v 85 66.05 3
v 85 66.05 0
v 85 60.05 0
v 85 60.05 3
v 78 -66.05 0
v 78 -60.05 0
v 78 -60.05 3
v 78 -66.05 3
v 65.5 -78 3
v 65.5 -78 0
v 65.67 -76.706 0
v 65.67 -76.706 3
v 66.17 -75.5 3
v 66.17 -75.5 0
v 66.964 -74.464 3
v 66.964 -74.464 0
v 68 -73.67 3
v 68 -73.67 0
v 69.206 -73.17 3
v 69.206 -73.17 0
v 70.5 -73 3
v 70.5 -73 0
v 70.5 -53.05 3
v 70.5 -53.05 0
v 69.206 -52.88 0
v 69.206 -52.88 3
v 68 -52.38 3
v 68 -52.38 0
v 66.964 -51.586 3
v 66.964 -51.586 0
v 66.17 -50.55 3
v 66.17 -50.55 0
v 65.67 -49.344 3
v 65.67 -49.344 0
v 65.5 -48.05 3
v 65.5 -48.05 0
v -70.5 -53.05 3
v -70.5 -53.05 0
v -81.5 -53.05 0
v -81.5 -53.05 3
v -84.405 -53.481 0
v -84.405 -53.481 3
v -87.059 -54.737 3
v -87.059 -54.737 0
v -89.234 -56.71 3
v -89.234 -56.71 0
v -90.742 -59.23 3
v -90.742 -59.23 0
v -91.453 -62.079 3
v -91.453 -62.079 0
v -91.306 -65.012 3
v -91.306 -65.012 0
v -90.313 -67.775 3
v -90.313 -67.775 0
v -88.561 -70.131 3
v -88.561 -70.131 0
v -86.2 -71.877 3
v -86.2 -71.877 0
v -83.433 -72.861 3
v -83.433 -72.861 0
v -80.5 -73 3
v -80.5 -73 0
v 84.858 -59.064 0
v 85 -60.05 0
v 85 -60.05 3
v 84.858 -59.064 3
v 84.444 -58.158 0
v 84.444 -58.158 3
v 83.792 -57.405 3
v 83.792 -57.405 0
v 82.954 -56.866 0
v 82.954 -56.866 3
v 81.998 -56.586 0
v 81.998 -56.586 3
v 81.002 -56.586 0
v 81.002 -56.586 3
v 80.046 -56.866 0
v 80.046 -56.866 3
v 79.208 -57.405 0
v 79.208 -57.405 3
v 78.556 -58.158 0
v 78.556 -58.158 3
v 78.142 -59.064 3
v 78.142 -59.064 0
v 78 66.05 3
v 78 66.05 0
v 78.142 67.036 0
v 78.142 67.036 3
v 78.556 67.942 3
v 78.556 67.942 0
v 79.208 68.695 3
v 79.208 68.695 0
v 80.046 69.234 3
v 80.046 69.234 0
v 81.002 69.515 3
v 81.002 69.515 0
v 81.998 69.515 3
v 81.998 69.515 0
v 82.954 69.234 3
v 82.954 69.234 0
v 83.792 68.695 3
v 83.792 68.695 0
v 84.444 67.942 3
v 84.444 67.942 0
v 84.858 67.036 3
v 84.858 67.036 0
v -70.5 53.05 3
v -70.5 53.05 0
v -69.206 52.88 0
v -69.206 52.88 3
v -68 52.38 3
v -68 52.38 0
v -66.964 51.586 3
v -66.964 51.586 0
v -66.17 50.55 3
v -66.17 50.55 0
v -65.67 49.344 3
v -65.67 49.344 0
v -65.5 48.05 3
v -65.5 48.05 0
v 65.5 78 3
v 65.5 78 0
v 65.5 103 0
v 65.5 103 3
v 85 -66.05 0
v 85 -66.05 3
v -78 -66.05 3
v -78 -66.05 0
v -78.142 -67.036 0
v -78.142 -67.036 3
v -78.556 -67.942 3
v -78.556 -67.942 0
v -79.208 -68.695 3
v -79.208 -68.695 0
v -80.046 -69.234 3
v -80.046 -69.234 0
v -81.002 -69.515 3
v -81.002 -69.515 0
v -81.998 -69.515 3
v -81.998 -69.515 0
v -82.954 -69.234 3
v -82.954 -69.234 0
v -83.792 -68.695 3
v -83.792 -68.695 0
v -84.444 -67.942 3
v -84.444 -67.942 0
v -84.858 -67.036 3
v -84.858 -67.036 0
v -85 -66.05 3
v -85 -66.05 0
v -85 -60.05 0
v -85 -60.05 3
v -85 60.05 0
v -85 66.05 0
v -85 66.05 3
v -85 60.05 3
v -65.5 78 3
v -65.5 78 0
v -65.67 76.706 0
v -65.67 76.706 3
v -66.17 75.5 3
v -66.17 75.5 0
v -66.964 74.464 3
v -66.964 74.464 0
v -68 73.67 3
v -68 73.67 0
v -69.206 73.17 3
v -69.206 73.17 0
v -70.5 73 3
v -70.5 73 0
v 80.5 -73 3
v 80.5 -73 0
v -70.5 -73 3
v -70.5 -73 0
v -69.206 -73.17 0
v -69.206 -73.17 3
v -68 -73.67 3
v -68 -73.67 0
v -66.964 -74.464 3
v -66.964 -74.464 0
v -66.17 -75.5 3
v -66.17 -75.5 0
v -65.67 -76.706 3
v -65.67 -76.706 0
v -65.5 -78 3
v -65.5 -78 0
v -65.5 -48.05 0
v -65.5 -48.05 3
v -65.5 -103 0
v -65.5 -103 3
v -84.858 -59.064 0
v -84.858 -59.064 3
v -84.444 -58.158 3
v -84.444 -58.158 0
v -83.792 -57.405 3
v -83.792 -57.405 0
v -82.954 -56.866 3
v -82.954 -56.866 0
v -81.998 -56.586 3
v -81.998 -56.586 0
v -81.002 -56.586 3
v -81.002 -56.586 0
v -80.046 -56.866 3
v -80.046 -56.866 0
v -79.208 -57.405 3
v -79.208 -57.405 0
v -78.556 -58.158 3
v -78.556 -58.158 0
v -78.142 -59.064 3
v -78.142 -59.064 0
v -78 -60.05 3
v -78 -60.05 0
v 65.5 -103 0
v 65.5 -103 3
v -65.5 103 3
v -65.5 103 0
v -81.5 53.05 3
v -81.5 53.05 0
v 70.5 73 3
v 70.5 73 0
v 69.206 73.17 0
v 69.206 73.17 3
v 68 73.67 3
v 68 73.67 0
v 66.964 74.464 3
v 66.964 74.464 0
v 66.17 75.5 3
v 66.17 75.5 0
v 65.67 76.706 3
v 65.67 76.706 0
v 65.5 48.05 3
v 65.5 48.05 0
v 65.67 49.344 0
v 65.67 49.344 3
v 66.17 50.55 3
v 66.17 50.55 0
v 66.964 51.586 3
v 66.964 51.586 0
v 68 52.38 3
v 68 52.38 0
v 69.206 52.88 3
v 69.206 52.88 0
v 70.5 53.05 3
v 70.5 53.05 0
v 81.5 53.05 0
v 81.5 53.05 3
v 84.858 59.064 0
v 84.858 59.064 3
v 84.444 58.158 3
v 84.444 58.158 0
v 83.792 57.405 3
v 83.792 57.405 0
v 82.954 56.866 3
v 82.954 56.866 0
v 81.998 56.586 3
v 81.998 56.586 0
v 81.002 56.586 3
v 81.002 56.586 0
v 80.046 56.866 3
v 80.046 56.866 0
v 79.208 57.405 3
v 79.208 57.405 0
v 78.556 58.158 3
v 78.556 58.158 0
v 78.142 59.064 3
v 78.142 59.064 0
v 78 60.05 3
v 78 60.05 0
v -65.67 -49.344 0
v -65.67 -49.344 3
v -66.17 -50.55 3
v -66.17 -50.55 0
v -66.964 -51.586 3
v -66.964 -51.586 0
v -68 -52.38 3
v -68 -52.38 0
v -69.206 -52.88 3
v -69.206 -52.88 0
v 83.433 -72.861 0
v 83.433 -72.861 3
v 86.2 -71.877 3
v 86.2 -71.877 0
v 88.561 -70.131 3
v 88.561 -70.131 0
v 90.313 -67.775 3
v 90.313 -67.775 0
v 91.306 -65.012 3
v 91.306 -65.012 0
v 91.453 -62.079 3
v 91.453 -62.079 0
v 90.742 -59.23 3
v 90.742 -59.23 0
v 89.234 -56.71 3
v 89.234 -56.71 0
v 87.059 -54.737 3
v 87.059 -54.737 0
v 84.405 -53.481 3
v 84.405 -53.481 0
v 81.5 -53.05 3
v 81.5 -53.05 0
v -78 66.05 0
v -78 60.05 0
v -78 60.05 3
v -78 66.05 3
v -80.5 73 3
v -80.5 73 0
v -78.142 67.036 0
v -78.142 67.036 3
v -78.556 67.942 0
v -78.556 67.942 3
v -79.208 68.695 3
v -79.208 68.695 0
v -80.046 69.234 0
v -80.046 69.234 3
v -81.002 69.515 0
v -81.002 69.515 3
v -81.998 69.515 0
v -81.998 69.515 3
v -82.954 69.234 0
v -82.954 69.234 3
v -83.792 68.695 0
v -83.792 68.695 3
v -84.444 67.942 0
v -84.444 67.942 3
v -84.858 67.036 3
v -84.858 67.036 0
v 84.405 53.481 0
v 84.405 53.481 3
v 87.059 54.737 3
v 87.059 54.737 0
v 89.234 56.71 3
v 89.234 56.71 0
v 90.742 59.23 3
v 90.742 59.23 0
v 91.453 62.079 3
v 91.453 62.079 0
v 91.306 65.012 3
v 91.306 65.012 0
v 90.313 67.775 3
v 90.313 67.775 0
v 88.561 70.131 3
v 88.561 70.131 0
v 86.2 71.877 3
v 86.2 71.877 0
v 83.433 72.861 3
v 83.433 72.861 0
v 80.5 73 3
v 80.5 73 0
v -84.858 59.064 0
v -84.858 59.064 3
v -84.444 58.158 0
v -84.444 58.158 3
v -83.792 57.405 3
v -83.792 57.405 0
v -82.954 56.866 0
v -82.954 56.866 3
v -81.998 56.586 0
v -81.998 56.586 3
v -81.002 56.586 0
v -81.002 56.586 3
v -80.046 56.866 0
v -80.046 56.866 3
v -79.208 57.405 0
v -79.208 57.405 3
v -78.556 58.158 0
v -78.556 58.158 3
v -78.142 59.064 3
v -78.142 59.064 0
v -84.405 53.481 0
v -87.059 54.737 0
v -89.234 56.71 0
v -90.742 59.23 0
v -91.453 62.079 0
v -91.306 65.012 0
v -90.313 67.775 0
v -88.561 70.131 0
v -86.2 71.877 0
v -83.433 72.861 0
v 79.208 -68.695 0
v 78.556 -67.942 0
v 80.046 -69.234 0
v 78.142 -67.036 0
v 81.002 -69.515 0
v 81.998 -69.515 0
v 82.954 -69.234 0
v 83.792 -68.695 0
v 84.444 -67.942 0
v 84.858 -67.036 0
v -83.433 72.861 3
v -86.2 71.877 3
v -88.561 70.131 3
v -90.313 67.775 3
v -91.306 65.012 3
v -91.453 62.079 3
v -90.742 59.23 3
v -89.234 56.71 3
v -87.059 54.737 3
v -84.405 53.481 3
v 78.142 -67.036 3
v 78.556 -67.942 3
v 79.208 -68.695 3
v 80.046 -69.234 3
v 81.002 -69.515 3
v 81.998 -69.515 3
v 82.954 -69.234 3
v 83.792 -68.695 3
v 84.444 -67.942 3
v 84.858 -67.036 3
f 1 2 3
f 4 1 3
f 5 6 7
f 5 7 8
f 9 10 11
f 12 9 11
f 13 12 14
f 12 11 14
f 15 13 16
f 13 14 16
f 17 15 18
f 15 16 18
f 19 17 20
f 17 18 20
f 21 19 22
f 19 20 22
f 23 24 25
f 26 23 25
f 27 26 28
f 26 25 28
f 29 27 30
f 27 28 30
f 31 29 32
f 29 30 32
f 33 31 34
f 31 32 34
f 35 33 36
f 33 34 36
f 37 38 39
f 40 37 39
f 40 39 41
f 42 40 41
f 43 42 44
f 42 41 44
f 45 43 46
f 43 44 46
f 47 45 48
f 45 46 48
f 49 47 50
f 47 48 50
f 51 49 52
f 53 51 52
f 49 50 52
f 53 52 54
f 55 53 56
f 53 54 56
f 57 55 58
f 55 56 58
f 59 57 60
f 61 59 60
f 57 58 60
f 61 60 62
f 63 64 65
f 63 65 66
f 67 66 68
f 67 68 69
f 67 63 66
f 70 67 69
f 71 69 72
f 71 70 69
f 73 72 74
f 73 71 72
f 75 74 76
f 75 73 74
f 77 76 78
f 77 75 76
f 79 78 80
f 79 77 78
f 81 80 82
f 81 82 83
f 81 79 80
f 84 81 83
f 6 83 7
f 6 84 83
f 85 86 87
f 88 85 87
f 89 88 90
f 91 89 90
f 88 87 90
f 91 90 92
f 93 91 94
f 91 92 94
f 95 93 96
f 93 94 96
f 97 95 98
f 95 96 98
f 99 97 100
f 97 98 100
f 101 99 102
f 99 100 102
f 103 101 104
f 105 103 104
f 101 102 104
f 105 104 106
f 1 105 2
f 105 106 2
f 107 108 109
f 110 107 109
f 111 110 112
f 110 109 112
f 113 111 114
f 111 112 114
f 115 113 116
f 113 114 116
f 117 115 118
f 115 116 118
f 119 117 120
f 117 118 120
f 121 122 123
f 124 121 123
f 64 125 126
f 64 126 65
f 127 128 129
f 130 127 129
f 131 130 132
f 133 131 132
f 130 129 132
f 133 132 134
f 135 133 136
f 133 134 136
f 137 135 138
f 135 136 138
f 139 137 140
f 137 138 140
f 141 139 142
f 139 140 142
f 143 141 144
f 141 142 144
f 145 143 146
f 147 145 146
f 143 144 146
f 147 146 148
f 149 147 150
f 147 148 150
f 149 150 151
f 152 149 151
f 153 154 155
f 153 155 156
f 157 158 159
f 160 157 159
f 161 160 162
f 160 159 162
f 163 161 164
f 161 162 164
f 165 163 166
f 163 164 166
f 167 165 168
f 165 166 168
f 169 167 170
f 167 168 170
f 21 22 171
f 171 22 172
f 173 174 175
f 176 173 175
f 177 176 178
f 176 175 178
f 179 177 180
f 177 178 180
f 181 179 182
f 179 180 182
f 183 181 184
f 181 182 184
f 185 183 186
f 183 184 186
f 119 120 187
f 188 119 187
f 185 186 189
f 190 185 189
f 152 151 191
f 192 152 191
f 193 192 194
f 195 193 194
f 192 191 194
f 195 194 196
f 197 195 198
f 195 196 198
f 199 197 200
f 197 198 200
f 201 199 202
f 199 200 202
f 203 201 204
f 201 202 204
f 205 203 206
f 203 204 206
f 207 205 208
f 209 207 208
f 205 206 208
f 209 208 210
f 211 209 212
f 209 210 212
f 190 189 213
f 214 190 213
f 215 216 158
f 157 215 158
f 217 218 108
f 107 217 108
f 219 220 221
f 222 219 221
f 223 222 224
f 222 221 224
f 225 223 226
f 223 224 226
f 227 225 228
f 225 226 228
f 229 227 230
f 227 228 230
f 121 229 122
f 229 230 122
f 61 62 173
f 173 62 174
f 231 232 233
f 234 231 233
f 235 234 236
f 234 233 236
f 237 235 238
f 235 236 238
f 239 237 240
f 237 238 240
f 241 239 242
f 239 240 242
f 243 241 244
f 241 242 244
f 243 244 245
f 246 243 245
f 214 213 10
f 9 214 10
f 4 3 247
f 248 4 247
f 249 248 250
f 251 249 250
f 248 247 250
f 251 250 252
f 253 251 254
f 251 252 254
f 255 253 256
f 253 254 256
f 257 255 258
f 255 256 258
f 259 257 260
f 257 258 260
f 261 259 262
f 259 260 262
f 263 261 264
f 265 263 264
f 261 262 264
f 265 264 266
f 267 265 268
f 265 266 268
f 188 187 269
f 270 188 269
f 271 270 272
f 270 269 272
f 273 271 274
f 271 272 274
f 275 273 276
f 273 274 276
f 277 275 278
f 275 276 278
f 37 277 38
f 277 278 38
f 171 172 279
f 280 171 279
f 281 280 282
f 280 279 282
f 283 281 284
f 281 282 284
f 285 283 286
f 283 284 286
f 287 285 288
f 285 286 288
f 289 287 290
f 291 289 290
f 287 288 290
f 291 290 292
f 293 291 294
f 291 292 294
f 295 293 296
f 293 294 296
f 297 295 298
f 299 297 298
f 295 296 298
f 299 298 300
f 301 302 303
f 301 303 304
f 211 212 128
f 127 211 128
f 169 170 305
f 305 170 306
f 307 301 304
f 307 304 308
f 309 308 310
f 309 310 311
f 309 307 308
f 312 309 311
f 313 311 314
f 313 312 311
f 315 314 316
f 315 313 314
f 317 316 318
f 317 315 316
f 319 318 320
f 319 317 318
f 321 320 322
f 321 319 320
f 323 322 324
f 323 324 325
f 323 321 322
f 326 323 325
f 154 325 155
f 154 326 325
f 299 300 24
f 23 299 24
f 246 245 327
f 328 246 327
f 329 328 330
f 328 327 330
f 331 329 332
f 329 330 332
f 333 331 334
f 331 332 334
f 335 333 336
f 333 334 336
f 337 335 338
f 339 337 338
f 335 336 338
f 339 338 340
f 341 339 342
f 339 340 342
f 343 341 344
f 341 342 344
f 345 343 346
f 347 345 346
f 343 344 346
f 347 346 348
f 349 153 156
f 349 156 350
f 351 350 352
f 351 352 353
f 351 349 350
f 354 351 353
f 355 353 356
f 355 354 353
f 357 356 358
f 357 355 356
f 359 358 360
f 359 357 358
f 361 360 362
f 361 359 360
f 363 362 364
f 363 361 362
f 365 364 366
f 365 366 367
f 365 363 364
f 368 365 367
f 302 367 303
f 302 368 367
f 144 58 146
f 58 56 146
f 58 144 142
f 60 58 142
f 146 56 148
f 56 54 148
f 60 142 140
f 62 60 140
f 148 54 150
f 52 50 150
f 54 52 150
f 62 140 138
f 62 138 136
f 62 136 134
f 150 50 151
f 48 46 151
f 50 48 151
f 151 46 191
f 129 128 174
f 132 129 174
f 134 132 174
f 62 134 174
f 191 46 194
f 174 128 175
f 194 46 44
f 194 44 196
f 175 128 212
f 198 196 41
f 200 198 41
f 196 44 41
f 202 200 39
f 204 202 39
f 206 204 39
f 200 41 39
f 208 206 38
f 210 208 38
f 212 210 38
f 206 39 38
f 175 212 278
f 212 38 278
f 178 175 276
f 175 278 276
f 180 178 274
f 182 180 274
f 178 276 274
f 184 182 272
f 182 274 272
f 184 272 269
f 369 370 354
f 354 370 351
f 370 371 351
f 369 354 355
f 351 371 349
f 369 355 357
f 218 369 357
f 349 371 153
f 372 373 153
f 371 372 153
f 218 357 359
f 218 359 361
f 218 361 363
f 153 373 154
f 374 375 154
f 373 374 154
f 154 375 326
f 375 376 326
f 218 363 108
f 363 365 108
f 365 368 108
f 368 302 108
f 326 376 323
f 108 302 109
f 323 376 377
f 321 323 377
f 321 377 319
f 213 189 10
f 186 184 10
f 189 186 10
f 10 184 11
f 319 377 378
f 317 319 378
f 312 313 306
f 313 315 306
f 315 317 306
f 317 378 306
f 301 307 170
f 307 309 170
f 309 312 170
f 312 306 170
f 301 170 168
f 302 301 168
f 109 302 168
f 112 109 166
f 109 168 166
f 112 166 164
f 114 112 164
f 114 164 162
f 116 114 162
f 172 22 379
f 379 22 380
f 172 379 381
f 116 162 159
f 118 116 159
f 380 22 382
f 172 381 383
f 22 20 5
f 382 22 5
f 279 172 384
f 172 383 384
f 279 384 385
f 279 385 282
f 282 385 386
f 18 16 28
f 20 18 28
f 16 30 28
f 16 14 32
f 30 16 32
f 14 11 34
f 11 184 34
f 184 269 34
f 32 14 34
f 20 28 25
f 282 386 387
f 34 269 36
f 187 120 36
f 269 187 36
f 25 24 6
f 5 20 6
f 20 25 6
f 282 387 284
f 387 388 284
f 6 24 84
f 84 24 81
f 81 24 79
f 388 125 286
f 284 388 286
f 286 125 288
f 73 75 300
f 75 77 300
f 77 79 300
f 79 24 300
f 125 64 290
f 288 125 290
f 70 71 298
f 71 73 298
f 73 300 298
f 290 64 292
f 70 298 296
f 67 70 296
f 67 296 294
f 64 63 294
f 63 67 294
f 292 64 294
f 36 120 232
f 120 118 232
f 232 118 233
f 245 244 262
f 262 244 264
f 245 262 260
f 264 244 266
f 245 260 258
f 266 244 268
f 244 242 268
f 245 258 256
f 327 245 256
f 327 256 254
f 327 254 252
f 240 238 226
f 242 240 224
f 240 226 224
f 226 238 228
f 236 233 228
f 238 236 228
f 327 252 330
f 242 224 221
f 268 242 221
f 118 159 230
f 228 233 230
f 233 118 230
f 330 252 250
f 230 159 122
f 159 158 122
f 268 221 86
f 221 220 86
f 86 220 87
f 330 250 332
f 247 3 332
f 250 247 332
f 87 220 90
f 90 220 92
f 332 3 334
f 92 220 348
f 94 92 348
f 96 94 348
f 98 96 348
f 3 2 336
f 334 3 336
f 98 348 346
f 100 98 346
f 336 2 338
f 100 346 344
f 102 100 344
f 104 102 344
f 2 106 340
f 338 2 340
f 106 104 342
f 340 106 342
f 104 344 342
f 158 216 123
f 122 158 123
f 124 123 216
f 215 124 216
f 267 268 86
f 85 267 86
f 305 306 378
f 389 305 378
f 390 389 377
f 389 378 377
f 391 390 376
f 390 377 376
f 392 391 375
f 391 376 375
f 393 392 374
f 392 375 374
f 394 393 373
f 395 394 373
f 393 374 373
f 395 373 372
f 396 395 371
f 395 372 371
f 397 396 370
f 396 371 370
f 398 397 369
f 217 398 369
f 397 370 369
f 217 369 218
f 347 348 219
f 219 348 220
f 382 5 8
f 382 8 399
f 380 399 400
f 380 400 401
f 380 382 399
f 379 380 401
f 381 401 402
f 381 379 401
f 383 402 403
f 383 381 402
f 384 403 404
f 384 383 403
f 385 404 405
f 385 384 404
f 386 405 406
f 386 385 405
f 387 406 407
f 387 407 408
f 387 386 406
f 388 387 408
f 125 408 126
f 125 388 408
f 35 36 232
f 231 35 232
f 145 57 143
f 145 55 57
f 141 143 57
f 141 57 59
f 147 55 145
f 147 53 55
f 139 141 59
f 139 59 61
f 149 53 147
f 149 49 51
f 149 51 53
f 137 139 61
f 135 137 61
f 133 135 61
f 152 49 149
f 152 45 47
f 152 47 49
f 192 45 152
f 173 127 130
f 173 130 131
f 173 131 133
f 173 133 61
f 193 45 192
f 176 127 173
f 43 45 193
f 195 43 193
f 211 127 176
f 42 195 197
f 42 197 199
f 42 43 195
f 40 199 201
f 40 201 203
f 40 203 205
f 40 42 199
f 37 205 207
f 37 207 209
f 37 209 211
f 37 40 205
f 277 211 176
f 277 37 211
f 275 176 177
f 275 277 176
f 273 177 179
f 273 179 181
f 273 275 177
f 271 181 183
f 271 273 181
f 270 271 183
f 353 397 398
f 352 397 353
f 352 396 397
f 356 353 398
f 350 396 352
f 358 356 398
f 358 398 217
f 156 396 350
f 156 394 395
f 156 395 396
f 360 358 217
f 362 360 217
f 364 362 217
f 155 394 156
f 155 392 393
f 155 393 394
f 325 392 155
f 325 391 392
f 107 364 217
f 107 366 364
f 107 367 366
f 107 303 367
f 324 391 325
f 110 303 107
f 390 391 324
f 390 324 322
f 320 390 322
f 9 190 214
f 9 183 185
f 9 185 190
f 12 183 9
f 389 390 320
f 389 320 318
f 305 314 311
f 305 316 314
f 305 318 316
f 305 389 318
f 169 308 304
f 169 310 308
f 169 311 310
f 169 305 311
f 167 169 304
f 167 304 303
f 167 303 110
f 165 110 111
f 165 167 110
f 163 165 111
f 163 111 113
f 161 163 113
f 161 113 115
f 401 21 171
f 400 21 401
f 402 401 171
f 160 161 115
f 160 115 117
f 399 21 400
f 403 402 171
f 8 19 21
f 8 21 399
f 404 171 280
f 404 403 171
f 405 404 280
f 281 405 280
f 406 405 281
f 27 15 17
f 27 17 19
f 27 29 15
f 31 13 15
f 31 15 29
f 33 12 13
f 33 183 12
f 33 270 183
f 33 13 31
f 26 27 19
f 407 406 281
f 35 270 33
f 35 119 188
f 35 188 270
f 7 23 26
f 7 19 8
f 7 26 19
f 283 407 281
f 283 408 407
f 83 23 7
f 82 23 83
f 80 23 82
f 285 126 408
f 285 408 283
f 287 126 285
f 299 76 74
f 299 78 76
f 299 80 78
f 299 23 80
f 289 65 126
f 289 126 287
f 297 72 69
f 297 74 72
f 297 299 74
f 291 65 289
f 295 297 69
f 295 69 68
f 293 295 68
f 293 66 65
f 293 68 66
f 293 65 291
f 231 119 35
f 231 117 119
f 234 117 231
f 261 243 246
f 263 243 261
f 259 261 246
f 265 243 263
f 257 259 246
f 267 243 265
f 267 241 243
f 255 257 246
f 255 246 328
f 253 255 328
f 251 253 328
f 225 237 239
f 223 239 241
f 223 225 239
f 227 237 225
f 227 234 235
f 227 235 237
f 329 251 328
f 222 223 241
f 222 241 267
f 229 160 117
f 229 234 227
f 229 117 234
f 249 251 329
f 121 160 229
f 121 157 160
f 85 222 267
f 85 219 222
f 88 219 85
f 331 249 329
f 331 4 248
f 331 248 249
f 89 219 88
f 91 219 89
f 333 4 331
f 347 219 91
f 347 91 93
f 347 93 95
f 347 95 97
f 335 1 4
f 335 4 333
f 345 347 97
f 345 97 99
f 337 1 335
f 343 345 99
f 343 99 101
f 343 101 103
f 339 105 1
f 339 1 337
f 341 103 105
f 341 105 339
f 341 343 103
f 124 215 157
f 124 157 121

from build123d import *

# Parameters (mm, degrees)
BOSS_EXTRUDE1_DEPTH = 3


with BuildPart() as part:
    # Sketch2 → Boss-Extrude1 (new body)
    with BuildSketch(Plane.XY):
        with BuildLine():
            Line((-65.5, -103), (65.5, -103))
            Line((65.5, -103), (65.5, -78))
            ThreePointArc((65.5, -78), (66.964466094, -74.464466094), (70.5, -73))
            Line((70.5, -73), (80.5, -73))
            ThreePointArc((80.5, -73), (91.487460731, -63.55075338), (81.5, -53.050125629))
            Line((81.5, -53.050125629), (70.5, -53.050125629))
            ThreePointArc((70.5, -53.050125629), (66.964466094, -51.585659535), (65.5, -48.050125629))
            Line((65.5, -48.050125629), (65.5, 48.050125629))
            ThreePointArc((65.5, 48.050125629), (66.964466094, 51.585659535), (70.5, 53.050125629))
            Line((70.5, 53.050125629), (81.5, 53.050125629))
            ThreePointArc((81.5, 53.050125629), (91.487460731, 63.55075338), (80.5, 73))
            Line((80.5, 73), (70.5, 73))
            ThreePointArc((70.5, 73), (66.964466094, 74.464466094), (65.5, 78))
            Line((65.5, 78), (65.5, 103))
            Line((65.5, 103), (-65.5, 103))
            Line((-65.5, 103), (-65.5, 78))
            ThreePointArc((-65.5, 78), (-66.964466094, 74.464466094), (-70.5, 73))
            Line((-70.5, 73), (-80.5, 73))
            ThreePointArc((-80.5, 73), (-91.487460731, 63.55075338), (-81.5, 53.050125629))
            Line((-81.5, 53.050125629), (-70.5, 53.050125629))
            ThreePointArc((-70.5, 53.050125629), (-66.964466094, 51.585659535), (-65.5, 48.050125629))
            Line((-65.5, 48.050125629), (-65.5, -48.050125629))
            ThreePointArc((-65.5, -48.050125629), (-66.964466094, -51.585659535), (-70.5, -53.050125629))
            Line((-70.5, -53.050125629), (-81.5, -53.050125629))
            ThreePointArc((-81.5, -53.050125629), (-91.487460731, -63.55075338), (-80.5, -73))
            Line((-80.5, -73), (-70.5, -73))
            ThreePointArc((-70.5, -73), (-66.964466094, -74.464466094), (-65.5, -78))
            Line((-65.5, -78), (-65.5, -103))
        make_face()
        with BuildLine():
            Line((78, 60.050125629), (78, 66.050125629))
            ThreePointArc((78, 66.050125629), (81.5, 69.550125629), (85, 66.050125629))
            Line((85, 66.050125629), (85, 60.050125629))
            ThreePointArc((85, 60.050125629), (81.5, 56.550125629), (78, 60.050125629))
        make_face(mode=Mode.SUBTRACT)
        with BuildLine():
            Line((-78, 60.050125629), (-78, 66.050125629))
            ThreePointArc((-78, 66.050125629), (-81.5, 69.550125629), (-85, 66.050125629))
            Line((-85, 66.050125629), (-85, 60.050125629))
            ThreePointArc((-85, 60.050125629), (-81.5, 56.550125629), (-78, 60.050125629))
        make_face(mode=Mode.SUBTRACT)
        with BuildLine():
            Line((-78, -60.050125629), (-78, -66.050125629))
            ThreePointArc((-78, -66.050125629), (-81.5, -69.550125629), (-85, -66.050125629))
            Line((-85, -66.050125629), (-85, -60.050125629))
            ThreePointArc((-85, -60.050125629), (-81.5, -56.550125629), (-78, -60.050125629))
        make_face(mode=Mode.SUBTRACT)
        with BuildLine():
            Line((78, -60.050125629), (78, -66.050125629))
            ThreePointArc((78, -66.050125629), (81.5, -69.550125629), (85, -66.050125629))
            Line((85, -66.050125629), (85, -60.050125629))
            ThreePointArc((85, -60.050125629), (81.5, -56.550125629), (78, -60.050125629))
        make_face(mode=Mode.SUBTRACT)
    extrude(amount=BOSS_EXTRUDE1_DEPTH)


solid = part.part
